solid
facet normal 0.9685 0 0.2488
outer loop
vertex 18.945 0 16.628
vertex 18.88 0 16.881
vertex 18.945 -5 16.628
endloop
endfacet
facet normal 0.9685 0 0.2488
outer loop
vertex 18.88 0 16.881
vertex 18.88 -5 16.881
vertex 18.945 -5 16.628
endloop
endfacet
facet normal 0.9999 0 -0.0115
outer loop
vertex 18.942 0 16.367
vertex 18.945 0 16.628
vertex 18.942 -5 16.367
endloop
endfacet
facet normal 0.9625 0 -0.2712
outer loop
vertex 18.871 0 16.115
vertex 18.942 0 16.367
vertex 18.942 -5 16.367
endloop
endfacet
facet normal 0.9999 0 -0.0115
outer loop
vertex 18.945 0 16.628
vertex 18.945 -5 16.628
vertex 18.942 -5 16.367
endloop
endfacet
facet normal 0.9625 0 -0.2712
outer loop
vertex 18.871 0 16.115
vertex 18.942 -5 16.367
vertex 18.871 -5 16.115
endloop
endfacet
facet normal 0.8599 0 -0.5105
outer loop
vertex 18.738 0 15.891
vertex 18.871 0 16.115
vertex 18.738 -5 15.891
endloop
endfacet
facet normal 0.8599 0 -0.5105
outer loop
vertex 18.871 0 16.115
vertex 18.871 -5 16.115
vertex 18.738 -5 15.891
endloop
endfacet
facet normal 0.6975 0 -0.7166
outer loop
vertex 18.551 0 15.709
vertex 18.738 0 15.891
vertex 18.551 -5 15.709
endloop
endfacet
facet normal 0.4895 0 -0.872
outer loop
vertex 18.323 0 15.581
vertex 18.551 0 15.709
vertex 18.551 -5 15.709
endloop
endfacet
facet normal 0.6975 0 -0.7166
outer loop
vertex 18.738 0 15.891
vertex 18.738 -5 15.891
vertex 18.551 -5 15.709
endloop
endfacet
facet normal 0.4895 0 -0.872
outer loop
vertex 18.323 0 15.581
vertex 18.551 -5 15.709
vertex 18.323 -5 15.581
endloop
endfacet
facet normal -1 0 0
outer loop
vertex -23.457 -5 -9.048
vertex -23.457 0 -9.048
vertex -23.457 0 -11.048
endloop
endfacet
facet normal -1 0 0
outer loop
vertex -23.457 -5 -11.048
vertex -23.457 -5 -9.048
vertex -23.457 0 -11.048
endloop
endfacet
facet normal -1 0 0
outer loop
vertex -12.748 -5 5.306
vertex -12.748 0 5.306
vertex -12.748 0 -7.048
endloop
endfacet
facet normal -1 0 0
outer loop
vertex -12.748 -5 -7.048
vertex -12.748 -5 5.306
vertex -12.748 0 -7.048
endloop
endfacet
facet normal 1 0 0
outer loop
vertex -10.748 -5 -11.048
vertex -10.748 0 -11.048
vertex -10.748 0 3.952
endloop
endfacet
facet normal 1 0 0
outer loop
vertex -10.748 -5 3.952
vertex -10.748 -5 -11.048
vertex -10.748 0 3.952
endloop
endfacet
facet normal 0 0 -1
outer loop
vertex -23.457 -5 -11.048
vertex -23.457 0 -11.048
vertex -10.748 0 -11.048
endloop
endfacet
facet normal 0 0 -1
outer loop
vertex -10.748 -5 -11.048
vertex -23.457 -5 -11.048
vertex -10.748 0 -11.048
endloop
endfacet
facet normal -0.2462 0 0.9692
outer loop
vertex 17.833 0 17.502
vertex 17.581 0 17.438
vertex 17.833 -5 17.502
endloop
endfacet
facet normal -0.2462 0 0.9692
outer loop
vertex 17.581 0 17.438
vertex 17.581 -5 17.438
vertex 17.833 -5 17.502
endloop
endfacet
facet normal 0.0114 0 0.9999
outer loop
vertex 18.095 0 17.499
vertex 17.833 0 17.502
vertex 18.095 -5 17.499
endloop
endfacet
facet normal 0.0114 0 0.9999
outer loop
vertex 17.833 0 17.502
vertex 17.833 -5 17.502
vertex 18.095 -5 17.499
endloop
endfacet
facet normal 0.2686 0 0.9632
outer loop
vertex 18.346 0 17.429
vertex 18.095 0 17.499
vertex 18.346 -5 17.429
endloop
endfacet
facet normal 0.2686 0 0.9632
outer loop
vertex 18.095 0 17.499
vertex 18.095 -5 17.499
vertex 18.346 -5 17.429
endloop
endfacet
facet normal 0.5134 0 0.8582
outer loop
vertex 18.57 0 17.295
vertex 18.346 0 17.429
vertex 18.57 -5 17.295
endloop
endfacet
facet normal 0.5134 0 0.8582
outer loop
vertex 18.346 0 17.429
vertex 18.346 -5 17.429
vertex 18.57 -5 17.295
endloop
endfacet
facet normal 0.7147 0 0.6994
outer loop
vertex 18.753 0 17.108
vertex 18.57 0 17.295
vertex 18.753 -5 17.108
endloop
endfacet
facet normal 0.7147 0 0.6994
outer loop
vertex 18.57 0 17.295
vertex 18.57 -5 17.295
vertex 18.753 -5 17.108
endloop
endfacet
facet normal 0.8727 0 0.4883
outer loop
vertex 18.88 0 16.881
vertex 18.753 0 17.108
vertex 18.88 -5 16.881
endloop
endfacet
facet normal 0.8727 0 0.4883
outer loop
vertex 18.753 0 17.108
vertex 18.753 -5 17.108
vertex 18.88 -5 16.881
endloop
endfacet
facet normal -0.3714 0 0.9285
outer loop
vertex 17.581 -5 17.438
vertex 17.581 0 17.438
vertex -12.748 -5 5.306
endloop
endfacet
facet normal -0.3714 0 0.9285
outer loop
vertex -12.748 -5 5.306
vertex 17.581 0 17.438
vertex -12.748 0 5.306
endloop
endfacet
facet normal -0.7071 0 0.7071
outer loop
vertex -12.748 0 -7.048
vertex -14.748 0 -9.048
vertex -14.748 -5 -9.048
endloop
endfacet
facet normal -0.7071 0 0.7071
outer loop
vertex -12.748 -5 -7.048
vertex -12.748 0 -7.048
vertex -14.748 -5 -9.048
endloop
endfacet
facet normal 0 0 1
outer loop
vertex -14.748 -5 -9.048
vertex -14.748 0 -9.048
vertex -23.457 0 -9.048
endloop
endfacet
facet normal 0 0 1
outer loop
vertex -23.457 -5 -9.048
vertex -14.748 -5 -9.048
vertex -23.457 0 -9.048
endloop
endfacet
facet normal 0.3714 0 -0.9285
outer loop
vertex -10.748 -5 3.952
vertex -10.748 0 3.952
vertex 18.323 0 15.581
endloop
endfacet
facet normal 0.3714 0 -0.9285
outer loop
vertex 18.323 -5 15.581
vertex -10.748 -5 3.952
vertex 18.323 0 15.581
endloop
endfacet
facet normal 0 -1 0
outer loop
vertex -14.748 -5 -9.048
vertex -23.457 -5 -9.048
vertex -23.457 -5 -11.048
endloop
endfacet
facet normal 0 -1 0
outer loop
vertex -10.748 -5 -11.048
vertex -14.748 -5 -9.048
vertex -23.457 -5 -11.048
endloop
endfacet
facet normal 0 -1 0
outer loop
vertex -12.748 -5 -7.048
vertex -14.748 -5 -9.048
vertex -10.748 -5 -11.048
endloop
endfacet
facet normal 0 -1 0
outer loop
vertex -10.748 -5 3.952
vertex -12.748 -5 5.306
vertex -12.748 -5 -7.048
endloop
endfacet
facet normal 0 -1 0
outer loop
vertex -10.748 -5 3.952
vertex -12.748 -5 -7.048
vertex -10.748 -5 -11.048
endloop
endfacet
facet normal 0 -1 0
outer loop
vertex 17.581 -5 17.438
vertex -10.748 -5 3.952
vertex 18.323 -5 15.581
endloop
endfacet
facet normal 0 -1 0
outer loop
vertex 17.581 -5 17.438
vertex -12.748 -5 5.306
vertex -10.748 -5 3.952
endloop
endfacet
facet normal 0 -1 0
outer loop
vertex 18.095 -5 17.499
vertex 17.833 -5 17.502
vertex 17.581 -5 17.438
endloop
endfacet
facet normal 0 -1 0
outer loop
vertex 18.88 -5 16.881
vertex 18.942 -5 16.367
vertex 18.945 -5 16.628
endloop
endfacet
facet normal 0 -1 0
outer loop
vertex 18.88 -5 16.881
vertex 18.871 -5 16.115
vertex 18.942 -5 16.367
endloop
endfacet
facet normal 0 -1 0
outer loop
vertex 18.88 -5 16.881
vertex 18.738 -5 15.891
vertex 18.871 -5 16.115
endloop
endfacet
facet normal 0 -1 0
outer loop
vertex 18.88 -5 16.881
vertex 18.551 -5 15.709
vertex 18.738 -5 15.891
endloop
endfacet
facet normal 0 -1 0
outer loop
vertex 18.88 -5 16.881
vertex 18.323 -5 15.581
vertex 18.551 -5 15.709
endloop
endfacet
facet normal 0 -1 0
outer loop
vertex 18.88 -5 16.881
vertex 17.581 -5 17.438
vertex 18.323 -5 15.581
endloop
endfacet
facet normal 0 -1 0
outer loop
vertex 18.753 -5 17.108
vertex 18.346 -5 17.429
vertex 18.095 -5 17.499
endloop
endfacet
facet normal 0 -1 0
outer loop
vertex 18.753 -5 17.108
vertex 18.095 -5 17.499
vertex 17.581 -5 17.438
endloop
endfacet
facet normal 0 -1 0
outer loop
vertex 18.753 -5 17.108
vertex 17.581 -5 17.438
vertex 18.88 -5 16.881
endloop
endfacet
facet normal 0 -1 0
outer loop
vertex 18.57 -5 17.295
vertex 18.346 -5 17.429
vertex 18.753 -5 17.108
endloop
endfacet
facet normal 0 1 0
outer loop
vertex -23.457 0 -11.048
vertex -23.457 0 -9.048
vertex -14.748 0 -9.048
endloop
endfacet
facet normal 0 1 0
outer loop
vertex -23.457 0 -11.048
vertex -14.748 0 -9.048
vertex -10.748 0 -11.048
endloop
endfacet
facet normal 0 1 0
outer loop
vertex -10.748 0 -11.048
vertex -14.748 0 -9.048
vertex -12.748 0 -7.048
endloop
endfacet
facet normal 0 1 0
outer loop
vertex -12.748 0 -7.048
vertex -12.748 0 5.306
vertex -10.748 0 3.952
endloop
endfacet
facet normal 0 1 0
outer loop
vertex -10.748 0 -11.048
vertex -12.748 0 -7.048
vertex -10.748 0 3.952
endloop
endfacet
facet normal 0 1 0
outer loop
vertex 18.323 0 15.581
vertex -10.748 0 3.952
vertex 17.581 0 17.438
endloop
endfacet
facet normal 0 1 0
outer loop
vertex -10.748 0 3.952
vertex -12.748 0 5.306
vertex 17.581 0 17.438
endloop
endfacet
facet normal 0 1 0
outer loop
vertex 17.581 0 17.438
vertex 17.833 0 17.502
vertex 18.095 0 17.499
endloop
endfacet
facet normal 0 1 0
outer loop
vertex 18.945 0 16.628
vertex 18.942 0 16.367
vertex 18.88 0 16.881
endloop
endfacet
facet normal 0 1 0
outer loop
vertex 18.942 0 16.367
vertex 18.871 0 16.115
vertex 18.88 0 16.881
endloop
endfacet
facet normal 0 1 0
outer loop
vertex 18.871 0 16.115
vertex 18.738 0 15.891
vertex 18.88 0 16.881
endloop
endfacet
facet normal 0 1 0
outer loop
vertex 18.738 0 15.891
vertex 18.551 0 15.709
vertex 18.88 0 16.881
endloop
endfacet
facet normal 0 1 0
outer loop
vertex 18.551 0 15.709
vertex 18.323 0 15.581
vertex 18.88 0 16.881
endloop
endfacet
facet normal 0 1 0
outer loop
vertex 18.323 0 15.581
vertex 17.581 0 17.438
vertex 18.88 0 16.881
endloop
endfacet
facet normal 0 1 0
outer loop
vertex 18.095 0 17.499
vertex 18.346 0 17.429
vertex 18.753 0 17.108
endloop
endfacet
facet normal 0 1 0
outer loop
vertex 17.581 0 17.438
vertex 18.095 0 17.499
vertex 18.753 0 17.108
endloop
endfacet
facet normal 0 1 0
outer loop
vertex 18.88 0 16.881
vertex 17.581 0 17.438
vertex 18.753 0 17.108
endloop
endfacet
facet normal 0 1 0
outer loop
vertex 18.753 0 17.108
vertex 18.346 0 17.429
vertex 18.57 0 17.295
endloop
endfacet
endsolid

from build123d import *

# Parameters (mm, degrees)
F1_DEPTH = 5
F2_SIZE  = 2
F3_R     = 0.99999


# Not quite as in the source:
# - a fillet or chamfer is up to 0.001 mm smaller than in the source, because OpenCascade refuses the exact size


with BuildPart() as f1:
    # F0 (on Front) → F1 (new body)
    with BuildSketch(Plane.XZ):
        Polygon((-10.7482137709, -11.0476701237), (-10.7482137709, 3.9523298763), (19.2517862291, 15.9523298763), (18.5090048764, 17.8092832581), (-12.7482137709, 5.3063957992), (-12.7482137709, -9.0476701237), (-23.457470371, -9.0476701237), (-23.457470371, -11.0476701237), align=None)
    extrude(amount=F1_DEPTH)

    # F2
    f2_edges = [f1.edges().sort_by_distance(p)[0] for p in [
        (-12.748214, -2.5, -9.04767),
    ]]
    chamfer(f2_edges, length=F2_SIZE)

    # F3 (radius 1 in the source; OpenCascade refuses exactly that, so slightly less here)
    f3_edges = [f1.edges().sort_by_distance(p)[0] for p in [
        (18.509005, -2.5, 17.809283),
        (19.251786, -2.5, 15.95233),
    ]]
    fillet(f3_edges, radius=F3_R)


solid = f1.part
